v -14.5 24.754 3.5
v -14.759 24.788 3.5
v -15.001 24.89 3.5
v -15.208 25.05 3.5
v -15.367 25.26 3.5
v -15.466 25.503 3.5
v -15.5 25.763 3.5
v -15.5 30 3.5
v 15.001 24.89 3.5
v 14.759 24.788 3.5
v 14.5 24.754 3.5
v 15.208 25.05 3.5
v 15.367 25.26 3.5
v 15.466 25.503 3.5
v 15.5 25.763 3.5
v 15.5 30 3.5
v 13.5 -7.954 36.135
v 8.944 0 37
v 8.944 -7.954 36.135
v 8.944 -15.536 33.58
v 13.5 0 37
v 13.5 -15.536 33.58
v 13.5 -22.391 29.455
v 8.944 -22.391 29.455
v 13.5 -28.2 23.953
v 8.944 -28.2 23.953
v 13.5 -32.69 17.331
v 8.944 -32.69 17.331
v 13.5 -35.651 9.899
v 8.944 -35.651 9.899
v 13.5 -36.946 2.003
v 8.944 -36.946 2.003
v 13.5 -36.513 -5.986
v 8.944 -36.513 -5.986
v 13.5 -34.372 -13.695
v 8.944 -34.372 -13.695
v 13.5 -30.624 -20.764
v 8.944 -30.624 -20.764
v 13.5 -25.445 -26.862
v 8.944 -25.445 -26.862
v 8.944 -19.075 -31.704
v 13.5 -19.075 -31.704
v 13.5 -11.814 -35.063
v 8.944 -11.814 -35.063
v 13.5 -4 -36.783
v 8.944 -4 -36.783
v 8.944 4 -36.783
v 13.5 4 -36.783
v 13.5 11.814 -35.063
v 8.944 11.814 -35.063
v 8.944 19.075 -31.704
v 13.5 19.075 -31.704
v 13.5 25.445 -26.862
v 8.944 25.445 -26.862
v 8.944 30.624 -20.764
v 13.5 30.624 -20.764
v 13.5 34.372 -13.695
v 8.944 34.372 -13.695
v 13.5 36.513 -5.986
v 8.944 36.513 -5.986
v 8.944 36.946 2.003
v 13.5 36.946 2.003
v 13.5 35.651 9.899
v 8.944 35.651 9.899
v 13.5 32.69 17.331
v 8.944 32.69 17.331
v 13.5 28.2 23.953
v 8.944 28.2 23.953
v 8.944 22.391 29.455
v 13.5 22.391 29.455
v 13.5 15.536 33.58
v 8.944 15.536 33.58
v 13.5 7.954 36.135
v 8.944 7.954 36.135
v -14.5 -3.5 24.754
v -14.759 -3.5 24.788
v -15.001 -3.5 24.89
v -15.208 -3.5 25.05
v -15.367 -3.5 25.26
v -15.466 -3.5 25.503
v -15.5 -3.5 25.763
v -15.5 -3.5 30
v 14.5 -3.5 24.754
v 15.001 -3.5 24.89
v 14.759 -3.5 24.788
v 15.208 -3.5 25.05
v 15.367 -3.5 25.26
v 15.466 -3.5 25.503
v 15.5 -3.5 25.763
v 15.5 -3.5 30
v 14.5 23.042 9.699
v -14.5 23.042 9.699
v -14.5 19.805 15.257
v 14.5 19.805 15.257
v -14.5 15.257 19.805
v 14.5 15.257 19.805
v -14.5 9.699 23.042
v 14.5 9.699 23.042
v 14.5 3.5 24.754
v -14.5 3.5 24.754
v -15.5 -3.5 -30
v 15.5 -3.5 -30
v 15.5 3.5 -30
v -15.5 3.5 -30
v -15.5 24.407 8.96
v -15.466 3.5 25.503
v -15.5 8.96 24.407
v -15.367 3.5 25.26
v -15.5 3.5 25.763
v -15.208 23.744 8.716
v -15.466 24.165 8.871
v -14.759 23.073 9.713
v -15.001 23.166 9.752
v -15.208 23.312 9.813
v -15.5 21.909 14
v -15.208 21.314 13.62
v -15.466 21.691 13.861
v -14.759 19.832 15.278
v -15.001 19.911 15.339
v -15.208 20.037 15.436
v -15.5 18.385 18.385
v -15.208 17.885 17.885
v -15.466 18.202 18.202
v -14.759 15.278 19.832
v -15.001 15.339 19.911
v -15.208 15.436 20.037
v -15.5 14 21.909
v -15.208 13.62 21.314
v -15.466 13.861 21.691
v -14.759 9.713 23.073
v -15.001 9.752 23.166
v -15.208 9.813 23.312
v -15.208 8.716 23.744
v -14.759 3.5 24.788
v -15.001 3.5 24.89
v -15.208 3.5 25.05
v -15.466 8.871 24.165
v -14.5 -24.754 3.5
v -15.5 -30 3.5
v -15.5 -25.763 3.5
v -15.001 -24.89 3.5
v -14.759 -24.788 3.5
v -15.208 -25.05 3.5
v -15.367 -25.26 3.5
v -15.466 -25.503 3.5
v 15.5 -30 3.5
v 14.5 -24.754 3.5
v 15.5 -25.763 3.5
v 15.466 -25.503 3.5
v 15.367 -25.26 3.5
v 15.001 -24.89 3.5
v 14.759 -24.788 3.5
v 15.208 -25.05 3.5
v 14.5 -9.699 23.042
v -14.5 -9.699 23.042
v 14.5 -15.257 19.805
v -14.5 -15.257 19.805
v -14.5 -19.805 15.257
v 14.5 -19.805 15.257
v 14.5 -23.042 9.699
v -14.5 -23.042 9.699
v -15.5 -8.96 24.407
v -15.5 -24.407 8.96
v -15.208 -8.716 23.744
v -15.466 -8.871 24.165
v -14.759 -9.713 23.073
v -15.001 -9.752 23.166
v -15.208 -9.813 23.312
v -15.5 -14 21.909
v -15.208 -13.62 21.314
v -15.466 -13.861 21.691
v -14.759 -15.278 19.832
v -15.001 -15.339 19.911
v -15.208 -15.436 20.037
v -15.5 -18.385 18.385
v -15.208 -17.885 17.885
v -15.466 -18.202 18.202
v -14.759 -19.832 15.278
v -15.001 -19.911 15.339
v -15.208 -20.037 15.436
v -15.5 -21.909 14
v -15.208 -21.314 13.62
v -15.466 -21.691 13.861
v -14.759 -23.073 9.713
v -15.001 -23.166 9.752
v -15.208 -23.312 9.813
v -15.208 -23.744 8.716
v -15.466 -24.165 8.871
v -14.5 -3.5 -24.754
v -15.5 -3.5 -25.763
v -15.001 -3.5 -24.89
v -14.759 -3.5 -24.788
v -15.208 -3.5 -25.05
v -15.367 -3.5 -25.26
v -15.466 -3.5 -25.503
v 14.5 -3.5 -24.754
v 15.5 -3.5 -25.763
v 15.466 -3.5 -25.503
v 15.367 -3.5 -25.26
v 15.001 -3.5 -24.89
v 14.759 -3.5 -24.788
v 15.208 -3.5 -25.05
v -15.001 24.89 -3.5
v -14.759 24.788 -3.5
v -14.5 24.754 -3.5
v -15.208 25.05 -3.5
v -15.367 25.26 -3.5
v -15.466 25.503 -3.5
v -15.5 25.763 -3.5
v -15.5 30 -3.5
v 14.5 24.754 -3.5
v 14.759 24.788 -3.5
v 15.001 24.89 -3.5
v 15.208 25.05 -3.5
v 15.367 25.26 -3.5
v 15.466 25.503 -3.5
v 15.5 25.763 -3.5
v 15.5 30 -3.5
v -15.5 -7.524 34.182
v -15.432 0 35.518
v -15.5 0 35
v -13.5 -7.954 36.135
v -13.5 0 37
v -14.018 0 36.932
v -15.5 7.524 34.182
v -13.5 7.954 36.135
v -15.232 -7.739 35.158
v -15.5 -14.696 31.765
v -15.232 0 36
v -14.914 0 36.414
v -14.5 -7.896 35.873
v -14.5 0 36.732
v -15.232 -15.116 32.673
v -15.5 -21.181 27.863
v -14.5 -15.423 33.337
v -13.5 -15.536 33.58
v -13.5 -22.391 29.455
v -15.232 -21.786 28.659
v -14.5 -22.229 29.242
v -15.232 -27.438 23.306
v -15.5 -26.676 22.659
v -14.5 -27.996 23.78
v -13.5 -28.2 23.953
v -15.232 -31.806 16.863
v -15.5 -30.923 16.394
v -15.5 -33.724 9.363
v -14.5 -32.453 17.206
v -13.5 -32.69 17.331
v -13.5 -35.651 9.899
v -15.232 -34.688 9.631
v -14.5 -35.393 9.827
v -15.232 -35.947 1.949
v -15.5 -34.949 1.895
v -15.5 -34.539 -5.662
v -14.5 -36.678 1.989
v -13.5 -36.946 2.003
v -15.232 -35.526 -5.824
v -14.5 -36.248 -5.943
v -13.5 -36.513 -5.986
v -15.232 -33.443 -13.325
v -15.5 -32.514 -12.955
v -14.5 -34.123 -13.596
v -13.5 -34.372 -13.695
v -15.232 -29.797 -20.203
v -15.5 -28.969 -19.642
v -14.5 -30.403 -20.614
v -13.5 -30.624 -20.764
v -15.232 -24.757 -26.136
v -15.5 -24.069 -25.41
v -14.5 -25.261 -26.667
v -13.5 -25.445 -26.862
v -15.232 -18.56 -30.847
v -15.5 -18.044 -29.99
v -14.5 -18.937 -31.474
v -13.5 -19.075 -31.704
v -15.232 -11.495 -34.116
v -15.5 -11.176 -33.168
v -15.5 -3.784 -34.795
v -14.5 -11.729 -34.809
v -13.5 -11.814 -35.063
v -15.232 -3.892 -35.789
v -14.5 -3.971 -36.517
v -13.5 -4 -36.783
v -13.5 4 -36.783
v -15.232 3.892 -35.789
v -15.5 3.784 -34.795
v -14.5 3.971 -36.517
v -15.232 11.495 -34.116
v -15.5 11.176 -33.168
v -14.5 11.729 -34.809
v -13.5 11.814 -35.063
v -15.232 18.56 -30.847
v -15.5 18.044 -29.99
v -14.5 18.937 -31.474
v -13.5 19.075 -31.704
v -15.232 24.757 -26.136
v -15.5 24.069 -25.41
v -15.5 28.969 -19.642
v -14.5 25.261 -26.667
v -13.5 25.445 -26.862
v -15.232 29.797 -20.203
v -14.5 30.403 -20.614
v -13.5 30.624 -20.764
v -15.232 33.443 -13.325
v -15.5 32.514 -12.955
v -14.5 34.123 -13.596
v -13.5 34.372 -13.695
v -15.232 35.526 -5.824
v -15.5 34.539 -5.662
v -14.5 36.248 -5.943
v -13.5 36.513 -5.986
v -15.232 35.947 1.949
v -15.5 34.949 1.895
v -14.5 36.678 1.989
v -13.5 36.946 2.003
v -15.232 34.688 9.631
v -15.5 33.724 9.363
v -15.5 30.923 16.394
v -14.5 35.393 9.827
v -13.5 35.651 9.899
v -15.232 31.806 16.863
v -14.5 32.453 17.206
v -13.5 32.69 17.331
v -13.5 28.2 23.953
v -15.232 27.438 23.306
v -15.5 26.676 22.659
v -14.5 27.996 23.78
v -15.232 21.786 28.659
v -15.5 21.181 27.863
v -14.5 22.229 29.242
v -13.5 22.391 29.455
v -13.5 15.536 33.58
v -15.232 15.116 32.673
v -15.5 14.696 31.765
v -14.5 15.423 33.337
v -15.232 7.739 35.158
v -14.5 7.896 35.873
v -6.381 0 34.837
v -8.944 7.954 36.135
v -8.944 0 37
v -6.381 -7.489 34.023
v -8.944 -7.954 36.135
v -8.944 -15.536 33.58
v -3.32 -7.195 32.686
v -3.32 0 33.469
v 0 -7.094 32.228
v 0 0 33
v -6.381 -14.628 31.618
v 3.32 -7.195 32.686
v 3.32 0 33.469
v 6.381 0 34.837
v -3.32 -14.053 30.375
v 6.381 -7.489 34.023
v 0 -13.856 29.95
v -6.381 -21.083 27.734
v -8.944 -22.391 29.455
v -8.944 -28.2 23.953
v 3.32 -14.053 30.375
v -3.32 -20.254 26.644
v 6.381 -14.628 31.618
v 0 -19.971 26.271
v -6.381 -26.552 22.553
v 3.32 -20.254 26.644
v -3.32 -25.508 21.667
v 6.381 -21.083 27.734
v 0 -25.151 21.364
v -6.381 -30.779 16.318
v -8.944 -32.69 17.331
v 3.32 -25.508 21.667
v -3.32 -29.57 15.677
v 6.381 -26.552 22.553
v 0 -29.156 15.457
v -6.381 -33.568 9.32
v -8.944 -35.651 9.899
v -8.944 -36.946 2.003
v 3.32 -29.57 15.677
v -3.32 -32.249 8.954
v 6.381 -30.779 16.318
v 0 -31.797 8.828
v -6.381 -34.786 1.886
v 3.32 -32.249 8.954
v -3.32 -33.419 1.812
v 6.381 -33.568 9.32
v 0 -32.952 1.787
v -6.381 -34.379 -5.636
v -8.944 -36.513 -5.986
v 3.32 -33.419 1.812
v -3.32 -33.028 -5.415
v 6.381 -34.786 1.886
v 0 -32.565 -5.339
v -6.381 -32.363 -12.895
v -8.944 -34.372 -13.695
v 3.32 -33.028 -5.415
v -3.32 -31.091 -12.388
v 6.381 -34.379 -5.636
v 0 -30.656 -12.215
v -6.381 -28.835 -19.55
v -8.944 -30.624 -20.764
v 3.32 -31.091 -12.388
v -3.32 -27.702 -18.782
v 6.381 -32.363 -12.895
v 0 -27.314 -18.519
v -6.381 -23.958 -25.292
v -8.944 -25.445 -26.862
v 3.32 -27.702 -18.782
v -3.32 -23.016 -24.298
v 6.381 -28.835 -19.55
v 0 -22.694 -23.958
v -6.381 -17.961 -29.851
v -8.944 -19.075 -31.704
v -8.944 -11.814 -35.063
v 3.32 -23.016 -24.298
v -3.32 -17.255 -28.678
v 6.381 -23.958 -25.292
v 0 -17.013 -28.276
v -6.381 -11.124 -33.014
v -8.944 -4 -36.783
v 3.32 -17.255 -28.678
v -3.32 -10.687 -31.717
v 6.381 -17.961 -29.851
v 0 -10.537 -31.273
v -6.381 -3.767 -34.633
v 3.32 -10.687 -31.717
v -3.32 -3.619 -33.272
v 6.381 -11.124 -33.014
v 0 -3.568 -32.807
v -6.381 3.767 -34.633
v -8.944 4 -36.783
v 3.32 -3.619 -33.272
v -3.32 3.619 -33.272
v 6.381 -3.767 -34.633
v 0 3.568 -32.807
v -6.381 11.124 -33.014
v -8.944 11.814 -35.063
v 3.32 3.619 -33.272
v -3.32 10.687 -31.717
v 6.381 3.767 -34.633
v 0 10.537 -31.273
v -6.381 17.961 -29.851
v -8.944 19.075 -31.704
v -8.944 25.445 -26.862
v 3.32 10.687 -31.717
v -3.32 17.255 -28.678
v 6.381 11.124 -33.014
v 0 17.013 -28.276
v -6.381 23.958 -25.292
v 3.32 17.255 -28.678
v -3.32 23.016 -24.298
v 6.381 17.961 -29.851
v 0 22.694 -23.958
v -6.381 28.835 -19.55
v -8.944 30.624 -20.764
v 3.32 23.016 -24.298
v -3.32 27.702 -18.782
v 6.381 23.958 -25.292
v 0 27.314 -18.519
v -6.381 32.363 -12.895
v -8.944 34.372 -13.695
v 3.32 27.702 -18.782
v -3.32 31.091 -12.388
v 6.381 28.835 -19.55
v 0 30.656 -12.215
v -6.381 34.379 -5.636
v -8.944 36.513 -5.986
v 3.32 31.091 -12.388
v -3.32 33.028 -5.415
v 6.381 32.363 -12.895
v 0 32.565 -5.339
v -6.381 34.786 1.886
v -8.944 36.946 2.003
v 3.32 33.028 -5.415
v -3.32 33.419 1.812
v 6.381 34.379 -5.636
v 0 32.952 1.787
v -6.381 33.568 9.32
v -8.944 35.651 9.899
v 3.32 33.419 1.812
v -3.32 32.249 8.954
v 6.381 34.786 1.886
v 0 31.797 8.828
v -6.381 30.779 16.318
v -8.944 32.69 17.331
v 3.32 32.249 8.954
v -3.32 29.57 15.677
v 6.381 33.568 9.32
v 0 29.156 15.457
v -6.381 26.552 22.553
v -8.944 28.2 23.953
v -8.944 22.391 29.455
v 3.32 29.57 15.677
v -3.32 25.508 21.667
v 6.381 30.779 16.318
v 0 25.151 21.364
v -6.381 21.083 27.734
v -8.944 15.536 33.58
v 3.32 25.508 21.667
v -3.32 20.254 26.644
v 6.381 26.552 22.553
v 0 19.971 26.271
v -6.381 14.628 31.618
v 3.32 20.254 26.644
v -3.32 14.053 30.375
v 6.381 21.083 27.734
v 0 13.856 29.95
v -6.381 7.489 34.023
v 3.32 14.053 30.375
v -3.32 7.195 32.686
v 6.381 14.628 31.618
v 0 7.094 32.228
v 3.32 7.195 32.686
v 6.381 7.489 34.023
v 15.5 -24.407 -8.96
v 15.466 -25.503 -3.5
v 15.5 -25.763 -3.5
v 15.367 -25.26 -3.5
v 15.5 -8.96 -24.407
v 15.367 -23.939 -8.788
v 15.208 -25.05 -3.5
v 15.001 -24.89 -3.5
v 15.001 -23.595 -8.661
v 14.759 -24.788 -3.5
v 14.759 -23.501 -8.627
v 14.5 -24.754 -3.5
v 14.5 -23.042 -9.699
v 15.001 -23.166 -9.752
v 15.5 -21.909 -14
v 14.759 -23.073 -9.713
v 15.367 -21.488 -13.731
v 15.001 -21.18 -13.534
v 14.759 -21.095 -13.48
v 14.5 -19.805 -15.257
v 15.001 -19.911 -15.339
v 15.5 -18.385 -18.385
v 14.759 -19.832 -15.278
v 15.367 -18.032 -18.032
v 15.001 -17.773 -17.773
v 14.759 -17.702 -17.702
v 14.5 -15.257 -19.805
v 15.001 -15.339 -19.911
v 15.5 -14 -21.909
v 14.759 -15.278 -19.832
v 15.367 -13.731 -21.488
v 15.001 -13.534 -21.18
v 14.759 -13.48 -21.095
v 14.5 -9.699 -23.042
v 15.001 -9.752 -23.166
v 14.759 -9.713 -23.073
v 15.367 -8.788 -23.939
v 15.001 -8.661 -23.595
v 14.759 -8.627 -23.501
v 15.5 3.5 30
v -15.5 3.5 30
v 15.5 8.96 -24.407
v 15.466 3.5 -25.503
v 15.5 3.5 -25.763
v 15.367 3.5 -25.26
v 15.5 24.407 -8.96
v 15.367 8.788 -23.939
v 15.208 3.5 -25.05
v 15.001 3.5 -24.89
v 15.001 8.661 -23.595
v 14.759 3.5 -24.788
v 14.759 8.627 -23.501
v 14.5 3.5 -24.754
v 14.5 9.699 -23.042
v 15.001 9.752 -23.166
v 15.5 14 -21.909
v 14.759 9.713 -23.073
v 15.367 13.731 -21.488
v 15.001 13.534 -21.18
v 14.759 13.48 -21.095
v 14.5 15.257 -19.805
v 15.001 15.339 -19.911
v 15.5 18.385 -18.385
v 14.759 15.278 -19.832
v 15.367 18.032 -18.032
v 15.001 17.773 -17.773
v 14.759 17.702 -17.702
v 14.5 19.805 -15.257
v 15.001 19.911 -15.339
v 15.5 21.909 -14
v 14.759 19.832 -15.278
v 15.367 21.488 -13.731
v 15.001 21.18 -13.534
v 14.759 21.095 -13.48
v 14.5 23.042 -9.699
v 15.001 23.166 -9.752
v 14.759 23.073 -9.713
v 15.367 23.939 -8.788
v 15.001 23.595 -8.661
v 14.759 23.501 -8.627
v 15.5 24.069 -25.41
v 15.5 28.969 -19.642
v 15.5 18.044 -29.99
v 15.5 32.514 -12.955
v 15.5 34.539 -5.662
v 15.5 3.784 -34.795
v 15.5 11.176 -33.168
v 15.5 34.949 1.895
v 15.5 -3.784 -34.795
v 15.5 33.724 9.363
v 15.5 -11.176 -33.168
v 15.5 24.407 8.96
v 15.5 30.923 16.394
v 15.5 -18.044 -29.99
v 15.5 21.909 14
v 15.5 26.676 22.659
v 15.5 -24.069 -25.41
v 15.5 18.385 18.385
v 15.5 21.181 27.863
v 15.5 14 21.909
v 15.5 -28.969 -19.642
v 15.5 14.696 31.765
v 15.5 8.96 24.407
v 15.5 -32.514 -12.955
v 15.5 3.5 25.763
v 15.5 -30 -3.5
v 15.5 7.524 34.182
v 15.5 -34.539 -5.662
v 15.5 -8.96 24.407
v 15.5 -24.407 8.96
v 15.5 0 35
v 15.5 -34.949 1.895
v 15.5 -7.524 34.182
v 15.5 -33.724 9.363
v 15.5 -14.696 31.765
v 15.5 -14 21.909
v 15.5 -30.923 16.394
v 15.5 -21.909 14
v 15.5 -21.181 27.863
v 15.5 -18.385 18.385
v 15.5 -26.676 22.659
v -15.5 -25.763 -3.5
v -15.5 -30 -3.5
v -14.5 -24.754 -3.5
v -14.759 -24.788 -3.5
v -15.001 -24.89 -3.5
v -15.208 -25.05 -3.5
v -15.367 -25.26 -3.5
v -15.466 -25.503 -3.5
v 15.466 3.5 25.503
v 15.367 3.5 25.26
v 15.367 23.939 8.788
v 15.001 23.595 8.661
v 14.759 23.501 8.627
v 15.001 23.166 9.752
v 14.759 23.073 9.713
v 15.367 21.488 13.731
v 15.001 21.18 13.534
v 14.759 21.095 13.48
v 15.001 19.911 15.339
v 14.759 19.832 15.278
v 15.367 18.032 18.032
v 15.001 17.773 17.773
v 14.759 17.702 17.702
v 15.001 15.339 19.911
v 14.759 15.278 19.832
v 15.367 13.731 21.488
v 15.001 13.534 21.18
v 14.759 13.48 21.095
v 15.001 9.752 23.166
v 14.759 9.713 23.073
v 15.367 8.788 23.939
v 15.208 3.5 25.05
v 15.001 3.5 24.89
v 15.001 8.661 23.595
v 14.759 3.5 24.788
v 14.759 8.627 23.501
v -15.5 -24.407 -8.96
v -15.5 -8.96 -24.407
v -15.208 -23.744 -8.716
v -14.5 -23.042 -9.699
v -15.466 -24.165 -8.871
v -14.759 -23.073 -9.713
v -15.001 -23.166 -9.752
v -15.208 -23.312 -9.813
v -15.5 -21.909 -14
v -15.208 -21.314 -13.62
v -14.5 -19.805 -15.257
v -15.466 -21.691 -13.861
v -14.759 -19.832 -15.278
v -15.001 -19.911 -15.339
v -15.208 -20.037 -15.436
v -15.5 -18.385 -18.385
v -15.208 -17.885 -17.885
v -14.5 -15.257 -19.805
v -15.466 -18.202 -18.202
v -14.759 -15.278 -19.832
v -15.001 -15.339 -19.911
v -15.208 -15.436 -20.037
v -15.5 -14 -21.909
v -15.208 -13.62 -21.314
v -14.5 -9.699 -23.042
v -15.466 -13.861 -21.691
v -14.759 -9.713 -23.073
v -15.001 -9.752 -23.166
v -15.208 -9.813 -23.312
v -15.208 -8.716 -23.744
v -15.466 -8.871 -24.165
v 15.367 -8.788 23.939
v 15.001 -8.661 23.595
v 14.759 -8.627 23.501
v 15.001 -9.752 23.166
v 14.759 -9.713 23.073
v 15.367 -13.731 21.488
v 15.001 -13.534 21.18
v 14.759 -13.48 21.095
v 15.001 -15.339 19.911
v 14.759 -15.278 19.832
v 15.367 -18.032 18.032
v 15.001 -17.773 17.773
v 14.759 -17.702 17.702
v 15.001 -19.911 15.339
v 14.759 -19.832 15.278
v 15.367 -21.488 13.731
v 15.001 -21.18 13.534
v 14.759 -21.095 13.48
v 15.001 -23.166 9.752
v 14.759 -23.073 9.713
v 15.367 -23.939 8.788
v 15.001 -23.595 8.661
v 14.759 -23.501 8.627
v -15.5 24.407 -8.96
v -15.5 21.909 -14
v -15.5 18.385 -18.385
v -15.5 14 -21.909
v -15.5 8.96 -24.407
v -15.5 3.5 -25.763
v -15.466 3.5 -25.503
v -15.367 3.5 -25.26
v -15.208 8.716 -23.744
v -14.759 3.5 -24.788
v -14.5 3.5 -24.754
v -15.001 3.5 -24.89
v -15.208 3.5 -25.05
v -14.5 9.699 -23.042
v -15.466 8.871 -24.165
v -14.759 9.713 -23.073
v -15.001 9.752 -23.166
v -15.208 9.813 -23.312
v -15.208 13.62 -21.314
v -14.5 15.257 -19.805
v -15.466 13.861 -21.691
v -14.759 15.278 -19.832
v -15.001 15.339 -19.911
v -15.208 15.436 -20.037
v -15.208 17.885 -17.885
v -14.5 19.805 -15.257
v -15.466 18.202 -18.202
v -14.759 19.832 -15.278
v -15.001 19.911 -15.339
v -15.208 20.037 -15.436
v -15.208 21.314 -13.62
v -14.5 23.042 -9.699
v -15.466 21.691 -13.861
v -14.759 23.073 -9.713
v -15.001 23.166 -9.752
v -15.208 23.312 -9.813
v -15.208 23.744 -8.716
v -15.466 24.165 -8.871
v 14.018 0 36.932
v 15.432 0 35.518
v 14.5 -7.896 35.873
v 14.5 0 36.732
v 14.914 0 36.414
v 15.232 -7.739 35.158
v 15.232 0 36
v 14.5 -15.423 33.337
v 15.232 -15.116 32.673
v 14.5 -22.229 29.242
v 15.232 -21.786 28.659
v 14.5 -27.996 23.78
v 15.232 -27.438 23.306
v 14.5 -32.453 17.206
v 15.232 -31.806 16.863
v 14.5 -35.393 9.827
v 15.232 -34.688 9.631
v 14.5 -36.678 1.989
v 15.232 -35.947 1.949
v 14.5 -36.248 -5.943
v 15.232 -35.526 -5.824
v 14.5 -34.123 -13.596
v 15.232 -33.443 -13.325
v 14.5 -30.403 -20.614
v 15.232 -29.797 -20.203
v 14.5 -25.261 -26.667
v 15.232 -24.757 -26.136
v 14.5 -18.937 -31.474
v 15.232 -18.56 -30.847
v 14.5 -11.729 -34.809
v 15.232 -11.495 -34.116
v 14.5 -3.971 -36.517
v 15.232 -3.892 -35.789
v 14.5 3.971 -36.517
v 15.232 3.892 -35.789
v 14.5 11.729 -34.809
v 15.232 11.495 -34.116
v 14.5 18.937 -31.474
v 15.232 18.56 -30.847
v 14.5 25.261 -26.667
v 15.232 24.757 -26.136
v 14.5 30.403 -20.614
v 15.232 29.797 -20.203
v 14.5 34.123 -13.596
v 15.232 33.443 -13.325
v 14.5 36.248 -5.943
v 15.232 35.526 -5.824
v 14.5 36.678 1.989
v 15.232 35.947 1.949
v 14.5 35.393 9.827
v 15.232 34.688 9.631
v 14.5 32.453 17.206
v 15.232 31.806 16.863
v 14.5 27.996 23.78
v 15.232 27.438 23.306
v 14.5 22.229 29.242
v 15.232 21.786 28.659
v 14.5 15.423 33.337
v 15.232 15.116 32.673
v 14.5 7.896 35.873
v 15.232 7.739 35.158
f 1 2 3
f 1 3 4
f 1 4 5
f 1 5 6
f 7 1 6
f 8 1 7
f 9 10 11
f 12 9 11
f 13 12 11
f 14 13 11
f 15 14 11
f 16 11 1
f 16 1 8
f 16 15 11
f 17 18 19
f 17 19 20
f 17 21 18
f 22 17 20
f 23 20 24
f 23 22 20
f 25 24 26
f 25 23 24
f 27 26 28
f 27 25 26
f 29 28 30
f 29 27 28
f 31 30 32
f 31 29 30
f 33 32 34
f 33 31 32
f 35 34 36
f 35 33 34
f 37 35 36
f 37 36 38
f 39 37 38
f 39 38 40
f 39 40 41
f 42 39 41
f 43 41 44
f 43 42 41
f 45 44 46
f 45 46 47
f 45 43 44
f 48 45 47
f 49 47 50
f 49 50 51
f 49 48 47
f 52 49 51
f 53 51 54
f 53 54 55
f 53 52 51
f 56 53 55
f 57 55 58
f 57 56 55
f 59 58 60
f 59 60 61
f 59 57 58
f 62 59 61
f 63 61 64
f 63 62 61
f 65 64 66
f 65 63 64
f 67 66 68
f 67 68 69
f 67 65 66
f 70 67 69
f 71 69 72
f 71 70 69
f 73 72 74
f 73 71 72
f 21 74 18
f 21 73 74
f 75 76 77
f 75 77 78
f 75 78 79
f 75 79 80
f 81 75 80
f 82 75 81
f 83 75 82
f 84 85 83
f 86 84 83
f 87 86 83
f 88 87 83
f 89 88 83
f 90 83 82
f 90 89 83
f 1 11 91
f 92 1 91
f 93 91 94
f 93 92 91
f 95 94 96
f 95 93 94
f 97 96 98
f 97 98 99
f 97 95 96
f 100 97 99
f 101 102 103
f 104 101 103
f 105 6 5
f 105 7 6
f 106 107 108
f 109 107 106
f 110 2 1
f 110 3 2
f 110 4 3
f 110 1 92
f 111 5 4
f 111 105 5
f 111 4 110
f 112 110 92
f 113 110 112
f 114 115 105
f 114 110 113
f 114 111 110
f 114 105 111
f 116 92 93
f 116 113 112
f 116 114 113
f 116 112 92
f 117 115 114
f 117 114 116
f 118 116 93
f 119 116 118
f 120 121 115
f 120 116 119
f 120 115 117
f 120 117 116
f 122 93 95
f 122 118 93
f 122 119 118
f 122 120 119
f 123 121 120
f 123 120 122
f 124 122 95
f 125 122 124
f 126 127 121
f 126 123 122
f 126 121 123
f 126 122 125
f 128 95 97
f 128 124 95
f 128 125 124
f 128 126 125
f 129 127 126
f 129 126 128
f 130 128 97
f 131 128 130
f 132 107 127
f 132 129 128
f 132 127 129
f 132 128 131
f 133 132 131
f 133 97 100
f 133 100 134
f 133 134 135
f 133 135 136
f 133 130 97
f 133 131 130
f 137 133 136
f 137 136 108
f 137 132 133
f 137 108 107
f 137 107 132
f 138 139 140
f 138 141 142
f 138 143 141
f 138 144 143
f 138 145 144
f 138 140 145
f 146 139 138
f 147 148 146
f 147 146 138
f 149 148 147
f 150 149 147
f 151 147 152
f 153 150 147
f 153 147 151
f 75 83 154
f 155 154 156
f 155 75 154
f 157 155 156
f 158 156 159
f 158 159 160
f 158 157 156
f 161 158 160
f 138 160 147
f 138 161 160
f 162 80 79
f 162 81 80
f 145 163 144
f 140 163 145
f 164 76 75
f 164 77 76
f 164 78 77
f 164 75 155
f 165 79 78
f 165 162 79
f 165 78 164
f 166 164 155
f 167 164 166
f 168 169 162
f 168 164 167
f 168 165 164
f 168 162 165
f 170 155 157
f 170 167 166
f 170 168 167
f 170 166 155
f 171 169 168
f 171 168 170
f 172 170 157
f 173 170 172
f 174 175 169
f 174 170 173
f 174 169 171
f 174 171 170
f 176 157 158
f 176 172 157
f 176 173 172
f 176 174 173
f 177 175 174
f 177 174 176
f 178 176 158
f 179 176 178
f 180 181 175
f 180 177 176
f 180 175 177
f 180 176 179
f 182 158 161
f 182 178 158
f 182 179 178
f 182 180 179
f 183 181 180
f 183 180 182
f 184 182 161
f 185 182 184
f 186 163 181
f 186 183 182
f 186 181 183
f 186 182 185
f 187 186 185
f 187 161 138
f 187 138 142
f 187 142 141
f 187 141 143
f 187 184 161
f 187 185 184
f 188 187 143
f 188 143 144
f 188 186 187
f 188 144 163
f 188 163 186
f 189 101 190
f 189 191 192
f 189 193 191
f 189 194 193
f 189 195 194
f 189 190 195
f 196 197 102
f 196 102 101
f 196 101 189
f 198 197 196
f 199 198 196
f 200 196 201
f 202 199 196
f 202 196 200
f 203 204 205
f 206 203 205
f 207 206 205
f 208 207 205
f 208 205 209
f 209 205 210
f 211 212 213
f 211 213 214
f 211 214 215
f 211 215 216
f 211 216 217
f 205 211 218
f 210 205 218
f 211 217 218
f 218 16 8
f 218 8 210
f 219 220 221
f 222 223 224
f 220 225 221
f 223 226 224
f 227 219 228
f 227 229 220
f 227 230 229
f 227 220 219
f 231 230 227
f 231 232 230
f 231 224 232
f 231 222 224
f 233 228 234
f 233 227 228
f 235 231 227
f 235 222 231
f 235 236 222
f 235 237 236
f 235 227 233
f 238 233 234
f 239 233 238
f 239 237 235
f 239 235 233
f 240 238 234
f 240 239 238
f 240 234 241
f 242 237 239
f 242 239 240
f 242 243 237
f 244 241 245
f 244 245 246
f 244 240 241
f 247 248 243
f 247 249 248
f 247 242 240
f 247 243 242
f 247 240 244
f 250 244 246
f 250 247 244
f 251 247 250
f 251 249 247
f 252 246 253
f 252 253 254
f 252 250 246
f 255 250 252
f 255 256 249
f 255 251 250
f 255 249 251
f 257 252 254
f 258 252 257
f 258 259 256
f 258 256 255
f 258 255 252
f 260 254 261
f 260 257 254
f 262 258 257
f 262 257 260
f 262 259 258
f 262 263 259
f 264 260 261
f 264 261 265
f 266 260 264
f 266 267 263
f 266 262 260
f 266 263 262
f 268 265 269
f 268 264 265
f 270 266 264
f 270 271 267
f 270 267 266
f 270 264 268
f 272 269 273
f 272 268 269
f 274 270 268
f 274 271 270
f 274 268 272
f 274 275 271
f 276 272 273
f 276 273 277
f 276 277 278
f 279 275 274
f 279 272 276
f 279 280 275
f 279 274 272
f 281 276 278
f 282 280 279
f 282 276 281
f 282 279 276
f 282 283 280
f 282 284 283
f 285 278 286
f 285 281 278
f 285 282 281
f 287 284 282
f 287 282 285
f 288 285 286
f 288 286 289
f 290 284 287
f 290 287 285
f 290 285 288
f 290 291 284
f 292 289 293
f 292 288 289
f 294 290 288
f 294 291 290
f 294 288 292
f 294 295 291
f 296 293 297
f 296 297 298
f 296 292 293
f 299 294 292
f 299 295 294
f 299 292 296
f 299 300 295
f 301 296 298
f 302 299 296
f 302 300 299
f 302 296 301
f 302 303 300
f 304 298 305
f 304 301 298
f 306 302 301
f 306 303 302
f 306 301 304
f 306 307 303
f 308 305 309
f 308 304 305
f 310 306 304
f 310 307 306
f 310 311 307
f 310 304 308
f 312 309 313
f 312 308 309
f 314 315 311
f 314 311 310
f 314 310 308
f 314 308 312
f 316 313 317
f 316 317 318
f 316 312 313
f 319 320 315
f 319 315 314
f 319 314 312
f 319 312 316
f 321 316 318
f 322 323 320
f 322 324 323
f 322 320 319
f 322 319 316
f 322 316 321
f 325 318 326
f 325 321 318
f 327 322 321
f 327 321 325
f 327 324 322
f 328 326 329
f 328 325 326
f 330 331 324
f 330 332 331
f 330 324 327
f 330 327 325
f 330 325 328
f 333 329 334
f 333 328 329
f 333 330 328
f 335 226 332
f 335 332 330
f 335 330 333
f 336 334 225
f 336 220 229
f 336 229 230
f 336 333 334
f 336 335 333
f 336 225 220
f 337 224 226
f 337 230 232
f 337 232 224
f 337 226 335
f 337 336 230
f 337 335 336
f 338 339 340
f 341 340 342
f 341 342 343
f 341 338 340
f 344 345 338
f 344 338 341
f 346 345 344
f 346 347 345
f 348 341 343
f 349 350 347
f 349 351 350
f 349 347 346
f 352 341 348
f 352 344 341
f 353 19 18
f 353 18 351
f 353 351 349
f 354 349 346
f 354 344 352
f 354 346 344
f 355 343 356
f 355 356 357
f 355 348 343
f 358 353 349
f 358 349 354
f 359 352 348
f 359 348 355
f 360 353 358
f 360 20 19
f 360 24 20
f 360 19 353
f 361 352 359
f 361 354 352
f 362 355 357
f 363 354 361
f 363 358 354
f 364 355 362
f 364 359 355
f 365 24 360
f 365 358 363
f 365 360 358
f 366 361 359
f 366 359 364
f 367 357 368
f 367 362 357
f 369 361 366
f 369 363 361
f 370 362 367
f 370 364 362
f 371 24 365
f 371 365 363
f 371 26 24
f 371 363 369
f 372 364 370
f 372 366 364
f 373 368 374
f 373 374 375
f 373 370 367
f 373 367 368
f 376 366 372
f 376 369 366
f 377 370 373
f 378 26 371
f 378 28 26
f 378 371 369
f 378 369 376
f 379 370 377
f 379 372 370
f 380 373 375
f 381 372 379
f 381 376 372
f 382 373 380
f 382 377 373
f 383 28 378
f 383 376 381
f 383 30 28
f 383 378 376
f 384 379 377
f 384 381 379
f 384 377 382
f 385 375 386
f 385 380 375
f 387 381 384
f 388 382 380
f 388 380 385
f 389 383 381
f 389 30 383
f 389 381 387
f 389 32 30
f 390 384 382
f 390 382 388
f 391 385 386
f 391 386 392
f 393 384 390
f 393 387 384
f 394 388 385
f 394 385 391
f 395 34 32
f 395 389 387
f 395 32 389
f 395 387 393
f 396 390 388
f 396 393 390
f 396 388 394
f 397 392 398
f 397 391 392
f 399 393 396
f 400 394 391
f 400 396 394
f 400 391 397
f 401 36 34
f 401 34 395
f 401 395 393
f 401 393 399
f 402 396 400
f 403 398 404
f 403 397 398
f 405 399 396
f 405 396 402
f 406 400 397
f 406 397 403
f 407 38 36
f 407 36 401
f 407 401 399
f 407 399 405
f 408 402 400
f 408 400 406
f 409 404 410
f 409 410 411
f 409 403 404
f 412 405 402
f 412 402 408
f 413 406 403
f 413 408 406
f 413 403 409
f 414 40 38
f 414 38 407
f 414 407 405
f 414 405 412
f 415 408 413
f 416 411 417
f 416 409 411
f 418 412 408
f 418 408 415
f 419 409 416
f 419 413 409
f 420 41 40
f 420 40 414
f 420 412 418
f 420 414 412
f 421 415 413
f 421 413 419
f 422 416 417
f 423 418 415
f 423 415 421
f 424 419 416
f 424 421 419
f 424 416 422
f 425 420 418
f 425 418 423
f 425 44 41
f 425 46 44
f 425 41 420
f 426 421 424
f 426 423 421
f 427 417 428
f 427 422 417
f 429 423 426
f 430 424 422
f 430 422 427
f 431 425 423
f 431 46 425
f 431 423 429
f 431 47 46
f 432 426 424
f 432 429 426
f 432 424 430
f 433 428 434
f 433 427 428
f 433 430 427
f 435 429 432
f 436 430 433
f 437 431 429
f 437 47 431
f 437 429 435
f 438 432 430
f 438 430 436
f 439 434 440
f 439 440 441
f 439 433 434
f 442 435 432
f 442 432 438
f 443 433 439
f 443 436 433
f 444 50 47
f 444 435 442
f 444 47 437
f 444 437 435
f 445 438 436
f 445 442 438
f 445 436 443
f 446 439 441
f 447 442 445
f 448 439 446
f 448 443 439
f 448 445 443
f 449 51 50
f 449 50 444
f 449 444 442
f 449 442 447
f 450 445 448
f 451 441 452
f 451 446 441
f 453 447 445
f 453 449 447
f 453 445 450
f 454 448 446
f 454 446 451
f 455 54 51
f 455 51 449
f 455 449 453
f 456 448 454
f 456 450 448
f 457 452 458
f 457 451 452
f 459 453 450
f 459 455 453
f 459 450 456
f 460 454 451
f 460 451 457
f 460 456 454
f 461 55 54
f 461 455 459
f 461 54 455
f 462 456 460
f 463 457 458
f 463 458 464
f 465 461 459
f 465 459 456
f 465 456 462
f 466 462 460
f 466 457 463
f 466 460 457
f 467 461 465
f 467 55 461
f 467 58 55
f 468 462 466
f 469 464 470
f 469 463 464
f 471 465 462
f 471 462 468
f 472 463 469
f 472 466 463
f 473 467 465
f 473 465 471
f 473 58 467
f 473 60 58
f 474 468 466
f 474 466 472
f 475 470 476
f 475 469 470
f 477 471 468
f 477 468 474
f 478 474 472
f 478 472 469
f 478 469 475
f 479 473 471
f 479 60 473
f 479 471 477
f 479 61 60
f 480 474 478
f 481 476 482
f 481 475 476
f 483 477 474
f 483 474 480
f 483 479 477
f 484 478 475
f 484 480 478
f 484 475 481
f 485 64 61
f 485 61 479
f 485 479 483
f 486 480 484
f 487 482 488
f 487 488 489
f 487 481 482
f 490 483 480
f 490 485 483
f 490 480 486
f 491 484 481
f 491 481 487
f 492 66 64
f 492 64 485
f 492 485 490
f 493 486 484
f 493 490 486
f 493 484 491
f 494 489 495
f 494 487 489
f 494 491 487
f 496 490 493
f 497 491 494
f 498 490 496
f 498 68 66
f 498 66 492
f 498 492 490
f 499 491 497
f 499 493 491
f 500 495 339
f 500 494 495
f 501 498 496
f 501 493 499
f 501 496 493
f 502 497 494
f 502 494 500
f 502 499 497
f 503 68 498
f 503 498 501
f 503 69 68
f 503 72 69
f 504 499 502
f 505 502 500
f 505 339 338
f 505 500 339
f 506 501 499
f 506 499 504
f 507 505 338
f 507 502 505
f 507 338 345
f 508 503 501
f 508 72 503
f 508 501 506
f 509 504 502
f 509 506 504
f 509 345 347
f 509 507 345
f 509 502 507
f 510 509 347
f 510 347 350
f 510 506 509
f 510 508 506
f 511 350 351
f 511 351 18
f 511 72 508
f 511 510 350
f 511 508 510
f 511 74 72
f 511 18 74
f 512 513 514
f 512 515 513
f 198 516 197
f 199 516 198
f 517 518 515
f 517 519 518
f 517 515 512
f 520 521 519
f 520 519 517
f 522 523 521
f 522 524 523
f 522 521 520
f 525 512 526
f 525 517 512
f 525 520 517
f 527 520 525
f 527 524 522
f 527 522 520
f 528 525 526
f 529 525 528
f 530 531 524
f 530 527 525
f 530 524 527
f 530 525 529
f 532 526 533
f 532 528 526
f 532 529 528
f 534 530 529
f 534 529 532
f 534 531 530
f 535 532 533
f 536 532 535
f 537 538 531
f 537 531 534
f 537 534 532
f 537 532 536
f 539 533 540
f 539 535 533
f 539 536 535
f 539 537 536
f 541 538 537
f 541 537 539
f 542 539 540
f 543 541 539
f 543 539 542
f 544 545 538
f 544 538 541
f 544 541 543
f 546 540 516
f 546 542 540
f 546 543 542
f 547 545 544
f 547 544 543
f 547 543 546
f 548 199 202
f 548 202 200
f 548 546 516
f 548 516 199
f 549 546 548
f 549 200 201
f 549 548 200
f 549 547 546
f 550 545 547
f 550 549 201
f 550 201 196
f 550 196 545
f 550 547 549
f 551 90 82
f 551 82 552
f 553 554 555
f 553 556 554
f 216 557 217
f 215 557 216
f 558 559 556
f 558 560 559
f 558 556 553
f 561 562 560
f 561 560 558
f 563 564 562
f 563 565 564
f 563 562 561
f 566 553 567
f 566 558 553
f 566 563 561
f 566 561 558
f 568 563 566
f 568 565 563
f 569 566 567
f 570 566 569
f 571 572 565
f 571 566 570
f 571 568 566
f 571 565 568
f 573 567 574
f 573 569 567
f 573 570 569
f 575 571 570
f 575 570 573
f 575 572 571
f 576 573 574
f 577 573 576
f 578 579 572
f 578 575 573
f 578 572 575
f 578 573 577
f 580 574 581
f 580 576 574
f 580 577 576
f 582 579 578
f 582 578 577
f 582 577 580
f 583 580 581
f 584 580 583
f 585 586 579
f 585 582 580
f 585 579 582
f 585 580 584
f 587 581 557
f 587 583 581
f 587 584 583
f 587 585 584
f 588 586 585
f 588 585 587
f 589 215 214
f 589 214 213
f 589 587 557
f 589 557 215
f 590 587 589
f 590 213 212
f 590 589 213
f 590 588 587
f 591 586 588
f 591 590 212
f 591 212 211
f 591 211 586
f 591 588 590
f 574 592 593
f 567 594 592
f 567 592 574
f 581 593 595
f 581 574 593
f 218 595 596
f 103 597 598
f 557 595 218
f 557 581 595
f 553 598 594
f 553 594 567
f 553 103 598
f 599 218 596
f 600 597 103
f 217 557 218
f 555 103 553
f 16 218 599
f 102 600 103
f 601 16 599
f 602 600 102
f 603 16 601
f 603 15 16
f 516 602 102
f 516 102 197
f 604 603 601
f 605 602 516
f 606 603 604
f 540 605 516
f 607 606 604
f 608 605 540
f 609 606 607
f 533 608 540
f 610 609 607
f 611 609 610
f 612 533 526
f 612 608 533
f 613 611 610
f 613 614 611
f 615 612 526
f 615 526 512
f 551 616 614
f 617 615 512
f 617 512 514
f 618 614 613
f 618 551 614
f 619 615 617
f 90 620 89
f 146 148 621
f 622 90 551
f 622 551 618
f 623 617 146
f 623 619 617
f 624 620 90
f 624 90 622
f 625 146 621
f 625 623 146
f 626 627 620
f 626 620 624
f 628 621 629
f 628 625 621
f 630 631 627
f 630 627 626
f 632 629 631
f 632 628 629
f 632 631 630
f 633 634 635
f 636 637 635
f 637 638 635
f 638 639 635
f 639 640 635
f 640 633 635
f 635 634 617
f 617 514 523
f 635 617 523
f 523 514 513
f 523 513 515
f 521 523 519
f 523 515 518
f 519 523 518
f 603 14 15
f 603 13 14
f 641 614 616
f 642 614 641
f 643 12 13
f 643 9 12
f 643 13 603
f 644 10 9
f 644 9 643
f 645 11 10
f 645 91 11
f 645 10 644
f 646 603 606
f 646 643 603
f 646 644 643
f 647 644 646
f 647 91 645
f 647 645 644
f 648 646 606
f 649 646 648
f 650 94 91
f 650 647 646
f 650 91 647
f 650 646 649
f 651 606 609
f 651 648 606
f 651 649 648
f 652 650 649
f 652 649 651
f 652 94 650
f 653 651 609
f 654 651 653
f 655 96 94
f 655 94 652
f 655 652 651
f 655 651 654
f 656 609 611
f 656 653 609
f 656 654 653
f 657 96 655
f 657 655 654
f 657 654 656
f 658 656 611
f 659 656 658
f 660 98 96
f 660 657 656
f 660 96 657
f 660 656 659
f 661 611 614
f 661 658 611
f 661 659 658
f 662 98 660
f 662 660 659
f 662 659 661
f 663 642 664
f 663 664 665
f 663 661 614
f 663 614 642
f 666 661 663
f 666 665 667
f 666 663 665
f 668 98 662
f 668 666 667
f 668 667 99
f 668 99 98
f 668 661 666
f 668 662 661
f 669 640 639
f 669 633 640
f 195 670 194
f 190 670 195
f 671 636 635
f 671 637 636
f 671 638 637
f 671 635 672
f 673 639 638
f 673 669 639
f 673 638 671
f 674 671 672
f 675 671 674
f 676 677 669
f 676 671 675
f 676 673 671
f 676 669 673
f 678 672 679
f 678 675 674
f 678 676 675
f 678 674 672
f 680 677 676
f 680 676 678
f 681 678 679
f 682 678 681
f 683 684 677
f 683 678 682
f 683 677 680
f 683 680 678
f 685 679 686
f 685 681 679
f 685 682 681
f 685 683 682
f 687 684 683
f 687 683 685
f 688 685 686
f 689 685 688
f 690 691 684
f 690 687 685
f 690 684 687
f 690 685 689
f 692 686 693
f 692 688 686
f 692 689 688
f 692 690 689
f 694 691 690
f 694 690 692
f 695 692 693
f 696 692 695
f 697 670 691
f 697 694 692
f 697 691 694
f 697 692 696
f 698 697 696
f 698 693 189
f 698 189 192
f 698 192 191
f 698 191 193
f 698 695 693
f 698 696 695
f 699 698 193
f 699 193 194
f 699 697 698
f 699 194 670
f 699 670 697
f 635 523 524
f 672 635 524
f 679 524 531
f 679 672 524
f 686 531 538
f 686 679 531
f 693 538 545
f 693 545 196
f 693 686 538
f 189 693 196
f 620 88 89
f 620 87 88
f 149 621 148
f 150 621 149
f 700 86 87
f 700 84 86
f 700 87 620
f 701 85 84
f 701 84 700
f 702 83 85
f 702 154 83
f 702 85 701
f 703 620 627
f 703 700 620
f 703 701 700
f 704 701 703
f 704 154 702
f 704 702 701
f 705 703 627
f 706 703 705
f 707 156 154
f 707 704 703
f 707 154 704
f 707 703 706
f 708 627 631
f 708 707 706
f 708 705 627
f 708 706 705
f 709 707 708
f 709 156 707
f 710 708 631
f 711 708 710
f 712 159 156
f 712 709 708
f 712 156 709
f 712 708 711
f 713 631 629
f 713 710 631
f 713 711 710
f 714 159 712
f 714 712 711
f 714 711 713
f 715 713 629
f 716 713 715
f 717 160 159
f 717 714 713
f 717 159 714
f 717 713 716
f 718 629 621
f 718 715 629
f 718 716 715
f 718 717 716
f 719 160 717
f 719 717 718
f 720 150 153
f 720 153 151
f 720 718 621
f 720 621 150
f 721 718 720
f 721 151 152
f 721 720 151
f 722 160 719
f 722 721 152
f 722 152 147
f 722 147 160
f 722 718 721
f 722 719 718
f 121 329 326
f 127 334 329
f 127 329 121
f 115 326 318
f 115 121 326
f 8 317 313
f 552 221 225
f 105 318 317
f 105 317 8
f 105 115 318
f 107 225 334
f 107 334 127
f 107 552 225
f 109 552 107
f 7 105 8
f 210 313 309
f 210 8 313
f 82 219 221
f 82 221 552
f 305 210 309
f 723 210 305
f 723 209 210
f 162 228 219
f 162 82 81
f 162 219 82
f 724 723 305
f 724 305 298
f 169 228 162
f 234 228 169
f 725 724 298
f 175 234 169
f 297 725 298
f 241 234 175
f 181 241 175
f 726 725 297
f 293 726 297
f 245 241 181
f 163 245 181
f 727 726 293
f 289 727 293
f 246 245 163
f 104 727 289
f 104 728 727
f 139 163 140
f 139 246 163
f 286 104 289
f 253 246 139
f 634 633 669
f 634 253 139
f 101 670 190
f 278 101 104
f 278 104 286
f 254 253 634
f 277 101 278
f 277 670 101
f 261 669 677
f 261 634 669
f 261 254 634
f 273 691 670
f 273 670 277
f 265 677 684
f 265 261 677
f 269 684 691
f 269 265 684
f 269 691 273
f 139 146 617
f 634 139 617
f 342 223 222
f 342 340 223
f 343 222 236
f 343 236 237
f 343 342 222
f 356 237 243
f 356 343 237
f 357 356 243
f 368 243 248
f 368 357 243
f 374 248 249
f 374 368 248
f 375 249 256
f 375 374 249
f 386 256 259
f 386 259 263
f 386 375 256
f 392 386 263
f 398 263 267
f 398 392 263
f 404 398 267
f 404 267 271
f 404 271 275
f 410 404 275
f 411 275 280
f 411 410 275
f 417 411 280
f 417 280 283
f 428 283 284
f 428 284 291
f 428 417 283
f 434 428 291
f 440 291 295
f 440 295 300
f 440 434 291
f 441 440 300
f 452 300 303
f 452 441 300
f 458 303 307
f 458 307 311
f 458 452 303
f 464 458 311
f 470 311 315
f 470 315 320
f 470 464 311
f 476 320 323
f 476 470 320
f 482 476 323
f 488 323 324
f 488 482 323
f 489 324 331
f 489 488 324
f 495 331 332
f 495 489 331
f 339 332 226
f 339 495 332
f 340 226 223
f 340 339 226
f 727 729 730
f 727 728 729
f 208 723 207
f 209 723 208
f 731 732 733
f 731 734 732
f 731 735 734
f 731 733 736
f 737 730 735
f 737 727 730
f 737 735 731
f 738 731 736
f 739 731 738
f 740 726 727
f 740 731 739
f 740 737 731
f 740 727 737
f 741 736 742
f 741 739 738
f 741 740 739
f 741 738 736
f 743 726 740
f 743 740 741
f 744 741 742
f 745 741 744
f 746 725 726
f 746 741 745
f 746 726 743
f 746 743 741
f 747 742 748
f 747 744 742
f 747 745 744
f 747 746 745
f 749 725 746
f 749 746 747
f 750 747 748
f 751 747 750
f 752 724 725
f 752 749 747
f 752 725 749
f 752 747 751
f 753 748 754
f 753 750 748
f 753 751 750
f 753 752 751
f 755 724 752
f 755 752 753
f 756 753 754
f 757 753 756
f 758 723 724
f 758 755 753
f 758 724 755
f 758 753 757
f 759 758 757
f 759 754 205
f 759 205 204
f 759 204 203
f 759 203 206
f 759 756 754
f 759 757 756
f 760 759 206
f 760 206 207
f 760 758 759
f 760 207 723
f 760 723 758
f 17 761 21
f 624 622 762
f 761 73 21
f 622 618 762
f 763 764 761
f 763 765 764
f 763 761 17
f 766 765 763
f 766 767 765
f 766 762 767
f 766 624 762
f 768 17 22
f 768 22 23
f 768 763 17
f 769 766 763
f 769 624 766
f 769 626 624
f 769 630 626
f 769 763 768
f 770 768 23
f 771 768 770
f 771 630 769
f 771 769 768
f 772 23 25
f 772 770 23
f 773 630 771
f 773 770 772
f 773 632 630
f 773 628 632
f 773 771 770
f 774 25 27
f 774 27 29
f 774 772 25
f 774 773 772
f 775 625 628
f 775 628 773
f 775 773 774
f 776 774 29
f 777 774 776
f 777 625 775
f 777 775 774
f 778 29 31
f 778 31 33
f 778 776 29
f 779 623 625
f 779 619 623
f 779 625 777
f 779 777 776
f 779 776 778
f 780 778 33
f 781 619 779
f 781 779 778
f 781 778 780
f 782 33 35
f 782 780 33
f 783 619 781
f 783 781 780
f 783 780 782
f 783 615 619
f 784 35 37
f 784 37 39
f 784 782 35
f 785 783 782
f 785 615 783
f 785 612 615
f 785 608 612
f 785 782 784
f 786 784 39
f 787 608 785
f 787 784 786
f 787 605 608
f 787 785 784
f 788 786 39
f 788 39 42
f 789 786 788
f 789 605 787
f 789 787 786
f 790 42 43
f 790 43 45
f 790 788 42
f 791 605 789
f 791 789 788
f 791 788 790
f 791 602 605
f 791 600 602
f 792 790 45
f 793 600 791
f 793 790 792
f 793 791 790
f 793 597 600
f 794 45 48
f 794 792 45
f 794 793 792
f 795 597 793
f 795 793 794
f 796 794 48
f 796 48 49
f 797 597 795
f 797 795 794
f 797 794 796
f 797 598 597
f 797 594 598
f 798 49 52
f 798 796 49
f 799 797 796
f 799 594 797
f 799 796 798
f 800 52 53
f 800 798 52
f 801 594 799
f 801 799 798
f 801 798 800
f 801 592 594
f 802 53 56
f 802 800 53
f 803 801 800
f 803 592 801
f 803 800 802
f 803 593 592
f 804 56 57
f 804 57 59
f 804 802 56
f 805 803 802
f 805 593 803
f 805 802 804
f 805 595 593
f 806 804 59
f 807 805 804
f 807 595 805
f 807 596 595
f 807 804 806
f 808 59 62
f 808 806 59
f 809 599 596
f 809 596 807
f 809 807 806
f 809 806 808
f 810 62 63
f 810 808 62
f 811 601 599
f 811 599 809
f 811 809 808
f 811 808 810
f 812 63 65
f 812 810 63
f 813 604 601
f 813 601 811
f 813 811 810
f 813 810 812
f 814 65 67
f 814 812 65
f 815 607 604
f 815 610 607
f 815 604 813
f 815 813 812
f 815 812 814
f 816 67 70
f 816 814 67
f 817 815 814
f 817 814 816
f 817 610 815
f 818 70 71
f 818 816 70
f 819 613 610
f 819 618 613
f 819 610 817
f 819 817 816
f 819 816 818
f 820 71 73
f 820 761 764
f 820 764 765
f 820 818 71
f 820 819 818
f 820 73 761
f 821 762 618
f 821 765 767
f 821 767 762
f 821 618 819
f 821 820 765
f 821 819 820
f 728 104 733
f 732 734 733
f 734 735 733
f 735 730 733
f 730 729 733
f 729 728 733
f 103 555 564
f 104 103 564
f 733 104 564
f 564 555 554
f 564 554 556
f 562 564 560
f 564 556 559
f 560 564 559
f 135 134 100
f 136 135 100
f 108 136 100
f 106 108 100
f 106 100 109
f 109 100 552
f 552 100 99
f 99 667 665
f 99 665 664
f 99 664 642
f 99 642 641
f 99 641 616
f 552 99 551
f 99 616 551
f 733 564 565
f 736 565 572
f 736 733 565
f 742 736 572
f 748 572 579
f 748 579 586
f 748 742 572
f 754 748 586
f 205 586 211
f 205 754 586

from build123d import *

# Parameters (mm, degrees)
SKETCH2_W          = 7
SKETCH2_H          = 60
CUT_EXTRUDE1_DEPTH = 55.57334521
CIRPATTERN1_COUNT  = 4


with BuildPart() as part:
    # Sketch1 → Revolve1 (revolve)
    with BuildSketch(Plane.XY, mode=Mode.PRIVATE) as revolve1_sk:
        with BuildLine():
            Line((-13.5, 37), (-8.94427191, 37))
            ThreePointArc((-8.94427191, 37), (0, 33), (8.94427191, 37))
            Line((8.94427191, 37), (13.5, 37))
            ThreePointArc((13.5, 37), (14.914213562, 36.414213562), (15.5, 35))
            Line((15.5, 35), (15.5, 26))
            ThreePointArc((15.5, 26), (15.207106781, 25.292893219), (14.5, 25))
            Line((14.5, 25), (-14.5, 25))
            ThreePointArc((-14.5, 25), (-15.207106781, 25.292893219), (-15.5, 26))
            Line((-15.5, 26), (-15.5, 35))
            ThreePointArc((-15.5, 35), (-14.914213562, 36.414213562), (-13.5, 37))
        make_face()
    revolve(revolve1_sk.sketch.rotate(Axis((0, 0, 0), (1, 0, 0)), 90), axis=Axis((0, 0, 0), (1, 0, 0)))

    # Sketch2 → Cut-Extrude1 (cut, symmetric)
    with BuildSketch(Plane(origin=(0, 0, 0), x_dir=(0, 0, -1), z_dir=(1, 0, 0))):
        Rectangle(SKETCH2_W, SKETCH2_H)
    cut_extrude1 = extrude(amount=CUT_EXTRUDE1_DEPTH, both=True, mode=Mode.SUBTRACT)

    # CirPattern1: Cut-Extrude1 ×4 about axis
    cirpattern1_axis = Axis((0, 0, 0), (1, 0, 0))
    for i in range(1, CIRPATTERN1_COUNT):
        add(cut_extrude1.rotate(cirpattern1_axis, i * 360 / CIRPATTERN1_COUNT), mode=Mode.SUBTRACT)


solid = part.part
